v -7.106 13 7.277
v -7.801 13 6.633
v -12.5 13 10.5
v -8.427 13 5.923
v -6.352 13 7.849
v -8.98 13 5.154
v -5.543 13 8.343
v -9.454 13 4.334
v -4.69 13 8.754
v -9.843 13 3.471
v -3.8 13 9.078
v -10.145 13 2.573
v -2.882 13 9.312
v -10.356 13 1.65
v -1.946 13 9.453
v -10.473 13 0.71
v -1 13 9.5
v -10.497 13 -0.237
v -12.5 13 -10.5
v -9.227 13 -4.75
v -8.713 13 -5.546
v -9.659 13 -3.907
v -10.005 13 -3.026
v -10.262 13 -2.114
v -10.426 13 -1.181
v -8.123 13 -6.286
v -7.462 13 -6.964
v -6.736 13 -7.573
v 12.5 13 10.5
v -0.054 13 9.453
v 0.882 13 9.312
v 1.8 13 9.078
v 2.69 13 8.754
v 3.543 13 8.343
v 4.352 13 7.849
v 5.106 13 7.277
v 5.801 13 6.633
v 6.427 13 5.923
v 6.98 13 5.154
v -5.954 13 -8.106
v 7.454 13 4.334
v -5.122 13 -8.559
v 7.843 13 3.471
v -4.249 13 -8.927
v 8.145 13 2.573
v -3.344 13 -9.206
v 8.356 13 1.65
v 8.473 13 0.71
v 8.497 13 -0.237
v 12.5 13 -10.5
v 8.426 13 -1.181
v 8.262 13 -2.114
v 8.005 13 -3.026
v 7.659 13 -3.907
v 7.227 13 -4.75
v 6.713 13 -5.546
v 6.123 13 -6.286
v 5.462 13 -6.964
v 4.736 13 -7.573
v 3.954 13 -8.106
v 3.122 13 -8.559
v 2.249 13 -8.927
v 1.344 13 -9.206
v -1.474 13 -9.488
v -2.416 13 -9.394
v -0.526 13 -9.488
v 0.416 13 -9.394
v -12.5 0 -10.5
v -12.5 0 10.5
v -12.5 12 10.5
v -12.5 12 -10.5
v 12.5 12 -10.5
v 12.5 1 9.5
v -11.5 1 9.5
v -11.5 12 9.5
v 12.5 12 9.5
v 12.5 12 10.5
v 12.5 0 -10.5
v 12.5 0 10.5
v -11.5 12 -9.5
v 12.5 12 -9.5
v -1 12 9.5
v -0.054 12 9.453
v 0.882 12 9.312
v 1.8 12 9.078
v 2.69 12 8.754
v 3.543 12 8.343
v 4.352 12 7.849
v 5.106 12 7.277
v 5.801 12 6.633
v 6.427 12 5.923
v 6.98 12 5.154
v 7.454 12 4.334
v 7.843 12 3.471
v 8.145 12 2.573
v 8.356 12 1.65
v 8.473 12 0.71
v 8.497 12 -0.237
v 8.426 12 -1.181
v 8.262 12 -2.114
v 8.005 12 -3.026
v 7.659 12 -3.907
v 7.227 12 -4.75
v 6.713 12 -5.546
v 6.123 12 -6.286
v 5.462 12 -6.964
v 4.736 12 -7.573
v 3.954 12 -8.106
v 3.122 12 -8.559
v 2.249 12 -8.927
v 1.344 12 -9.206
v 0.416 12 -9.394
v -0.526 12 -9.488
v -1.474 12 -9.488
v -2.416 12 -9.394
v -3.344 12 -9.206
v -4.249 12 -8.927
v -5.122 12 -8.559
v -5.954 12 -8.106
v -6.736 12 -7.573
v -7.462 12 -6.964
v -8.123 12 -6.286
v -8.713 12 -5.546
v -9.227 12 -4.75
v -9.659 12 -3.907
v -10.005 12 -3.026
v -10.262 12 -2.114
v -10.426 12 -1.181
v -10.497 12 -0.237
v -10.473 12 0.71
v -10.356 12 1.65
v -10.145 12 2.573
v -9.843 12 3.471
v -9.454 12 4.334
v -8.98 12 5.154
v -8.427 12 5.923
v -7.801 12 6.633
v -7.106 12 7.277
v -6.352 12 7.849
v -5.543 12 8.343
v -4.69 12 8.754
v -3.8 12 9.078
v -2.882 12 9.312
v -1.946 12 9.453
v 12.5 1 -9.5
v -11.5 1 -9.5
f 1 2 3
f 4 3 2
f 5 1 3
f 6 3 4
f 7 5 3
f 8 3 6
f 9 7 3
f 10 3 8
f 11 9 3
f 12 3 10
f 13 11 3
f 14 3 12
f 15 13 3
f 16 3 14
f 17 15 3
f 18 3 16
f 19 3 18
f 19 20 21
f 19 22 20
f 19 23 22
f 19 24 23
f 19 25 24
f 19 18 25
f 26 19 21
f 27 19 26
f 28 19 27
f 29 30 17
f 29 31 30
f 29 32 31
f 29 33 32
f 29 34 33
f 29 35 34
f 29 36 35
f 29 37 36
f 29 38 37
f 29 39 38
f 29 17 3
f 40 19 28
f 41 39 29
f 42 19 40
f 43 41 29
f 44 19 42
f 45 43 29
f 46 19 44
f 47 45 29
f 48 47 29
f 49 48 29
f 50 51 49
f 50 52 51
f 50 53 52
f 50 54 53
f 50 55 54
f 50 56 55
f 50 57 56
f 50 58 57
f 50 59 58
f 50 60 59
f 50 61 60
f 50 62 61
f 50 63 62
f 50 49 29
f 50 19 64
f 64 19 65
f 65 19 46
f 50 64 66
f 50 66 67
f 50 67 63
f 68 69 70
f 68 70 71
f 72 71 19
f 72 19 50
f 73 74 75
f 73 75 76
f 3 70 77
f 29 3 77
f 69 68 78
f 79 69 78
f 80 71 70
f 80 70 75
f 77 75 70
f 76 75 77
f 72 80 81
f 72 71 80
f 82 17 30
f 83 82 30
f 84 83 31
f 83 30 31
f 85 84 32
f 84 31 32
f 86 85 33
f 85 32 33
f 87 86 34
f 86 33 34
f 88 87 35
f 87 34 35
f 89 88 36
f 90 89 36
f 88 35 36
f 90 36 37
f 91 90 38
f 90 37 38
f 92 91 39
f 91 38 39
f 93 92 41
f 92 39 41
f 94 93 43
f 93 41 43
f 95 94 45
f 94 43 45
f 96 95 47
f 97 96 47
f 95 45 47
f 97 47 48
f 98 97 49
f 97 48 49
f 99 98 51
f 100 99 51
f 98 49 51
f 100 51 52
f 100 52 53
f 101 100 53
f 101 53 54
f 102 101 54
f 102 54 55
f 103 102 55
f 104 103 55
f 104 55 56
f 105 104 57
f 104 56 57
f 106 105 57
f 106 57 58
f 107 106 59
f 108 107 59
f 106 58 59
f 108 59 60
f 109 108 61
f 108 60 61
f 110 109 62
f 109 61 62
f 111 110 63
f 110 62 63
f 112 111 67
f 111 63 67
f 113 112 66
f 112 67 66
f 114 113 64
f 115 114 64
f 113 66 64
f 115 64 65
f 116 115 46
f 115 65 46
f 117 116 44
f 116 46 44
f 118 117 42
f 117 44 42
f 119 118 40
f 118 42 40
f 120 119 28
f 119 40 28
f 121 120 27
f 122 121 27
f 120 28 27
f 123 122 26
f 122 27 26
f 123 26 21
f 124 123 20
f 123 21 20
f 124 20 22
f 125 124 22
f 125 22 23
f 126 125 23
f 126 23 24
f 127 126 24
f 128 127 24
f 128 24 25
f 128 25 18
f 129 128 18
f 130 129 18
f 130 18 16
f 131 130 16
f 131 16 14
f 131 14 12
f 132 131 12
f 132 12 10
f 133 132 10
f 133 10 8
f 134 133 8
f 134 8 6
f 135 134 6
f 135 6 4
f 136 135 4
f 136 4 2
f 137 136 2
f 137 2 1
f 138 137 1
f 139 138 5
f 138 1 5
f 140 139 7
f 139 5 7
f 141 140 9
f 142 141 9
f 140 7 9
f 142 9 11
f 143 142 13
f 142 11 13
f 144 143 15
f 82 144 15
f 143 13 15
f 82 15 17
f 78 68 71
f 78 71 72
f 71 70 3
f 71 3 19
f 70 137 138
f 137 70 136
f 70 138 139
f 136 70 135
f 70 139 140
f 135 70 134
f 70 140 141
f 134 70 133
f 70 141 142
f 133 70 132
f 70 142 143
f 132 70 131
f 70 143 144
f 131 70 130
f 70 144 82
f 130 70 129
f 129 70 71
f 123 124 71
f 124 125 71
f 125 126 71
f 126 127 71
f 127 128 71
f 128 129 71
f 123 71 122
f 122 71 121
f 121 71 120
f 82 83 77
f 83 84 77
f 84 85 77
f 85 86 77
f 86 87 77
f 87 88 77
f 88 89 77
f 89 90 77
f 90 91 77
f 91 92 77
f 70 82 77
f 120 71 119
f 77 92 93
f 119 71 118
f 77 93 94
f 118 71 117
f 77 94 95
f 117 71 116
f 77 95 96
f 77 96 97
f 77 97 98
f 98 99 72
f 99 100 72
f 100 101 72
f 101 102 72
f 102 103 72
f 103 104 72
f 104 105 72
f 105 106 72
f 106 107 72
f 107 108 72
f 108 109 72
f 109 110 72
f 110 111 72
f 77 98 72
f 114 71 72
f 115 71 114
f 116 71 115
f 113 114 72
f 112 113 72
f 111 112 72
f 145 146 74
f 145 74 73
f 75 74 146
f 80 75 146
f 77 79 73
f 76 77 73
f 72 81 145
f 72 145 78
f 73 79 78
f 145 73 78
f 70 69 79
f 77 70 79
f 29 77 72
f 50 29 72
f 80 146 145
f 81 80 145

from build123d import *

# Parameters (mm, degrees)
SKETCH_1_W          = 25
SKETCH_1_H          = 21
EXTRUDE_1_DEPTH     = 12
CUT_EXTRUDE_START   = 1
SKETCH_2_W          = 25
SKETCH_2_H          = 19
CUT_EXTRUDE_1_DEPTH = 11
EXTRUDE_START       = 12
SKETCH_6_W          = 25
SKETCH_6_H          = 21
EXTRUDE_3_DEPTH     = 1
CUT_EXTRUDE_START_2 = 13
SKETCH_8_R          = 9.5
CUT_EXTRUDE_2_DEPTH = 1


with BuildPart() as part:
    # 스케치1 → 보스-돌출1 (new body)
    with BuildSketch(Plane(origin=(0, 0, 0), x_dir=(1, 0, 0), z_dir=(0, 1, 0))):
        Rectangle(SKETCH_1_W, SKETCH_1_H)
    extrude(amount=EXTRUDE_1_DEPTH)

    # 스케치2 → 컷-돌출1 (cut)
    with BuildSketch(Plane(origin=(0, 0, 0), x_dir=(1, 0, 0), z_dir=(0, 1, 0)).offset(CUT_EXTRUDE_START)):
        with Locations((1, 0)):
            Rectangle(SKETCH_2_W, SKETCH_2_H)
    extrude(amount=CUT_EXTRUDE_1_DEPTH, mode=Mode.SUBTRACT)


with BuildPart() as body_2:
    # 스케치6 → 보스-돌출3 (new body)
    with BuildSketch(Plane(origin=(0, 0, 0), x_dir=(1, 0, 0), z_dir=(0, 1, 0)).offset(EXTRUDE_START)):
        Rectangle(SKETCH_6_W, SKETCH_6_H)
    extrude(amount=EXTRUDE_3_DEPTH)

    # 스케치8 → 컷-돌출2 (cut)
    with BuildSketch(Plane(origin=(0, 0, 0), x_dir=(1, 0, 0), z_dir=(0, 1, 0)).offset(CUT_EXTRUDE_START_2)):
        with Locations(Location((-1, 0, 0), (0, 0, 270))):
            Circle(SKETCH_8_R)
    extrude(amount=-CUT_EXTRUDE_2_DEPTH, mode=Mode.SUBTRACT)


solid = Compound([part.part, body_2.part])
